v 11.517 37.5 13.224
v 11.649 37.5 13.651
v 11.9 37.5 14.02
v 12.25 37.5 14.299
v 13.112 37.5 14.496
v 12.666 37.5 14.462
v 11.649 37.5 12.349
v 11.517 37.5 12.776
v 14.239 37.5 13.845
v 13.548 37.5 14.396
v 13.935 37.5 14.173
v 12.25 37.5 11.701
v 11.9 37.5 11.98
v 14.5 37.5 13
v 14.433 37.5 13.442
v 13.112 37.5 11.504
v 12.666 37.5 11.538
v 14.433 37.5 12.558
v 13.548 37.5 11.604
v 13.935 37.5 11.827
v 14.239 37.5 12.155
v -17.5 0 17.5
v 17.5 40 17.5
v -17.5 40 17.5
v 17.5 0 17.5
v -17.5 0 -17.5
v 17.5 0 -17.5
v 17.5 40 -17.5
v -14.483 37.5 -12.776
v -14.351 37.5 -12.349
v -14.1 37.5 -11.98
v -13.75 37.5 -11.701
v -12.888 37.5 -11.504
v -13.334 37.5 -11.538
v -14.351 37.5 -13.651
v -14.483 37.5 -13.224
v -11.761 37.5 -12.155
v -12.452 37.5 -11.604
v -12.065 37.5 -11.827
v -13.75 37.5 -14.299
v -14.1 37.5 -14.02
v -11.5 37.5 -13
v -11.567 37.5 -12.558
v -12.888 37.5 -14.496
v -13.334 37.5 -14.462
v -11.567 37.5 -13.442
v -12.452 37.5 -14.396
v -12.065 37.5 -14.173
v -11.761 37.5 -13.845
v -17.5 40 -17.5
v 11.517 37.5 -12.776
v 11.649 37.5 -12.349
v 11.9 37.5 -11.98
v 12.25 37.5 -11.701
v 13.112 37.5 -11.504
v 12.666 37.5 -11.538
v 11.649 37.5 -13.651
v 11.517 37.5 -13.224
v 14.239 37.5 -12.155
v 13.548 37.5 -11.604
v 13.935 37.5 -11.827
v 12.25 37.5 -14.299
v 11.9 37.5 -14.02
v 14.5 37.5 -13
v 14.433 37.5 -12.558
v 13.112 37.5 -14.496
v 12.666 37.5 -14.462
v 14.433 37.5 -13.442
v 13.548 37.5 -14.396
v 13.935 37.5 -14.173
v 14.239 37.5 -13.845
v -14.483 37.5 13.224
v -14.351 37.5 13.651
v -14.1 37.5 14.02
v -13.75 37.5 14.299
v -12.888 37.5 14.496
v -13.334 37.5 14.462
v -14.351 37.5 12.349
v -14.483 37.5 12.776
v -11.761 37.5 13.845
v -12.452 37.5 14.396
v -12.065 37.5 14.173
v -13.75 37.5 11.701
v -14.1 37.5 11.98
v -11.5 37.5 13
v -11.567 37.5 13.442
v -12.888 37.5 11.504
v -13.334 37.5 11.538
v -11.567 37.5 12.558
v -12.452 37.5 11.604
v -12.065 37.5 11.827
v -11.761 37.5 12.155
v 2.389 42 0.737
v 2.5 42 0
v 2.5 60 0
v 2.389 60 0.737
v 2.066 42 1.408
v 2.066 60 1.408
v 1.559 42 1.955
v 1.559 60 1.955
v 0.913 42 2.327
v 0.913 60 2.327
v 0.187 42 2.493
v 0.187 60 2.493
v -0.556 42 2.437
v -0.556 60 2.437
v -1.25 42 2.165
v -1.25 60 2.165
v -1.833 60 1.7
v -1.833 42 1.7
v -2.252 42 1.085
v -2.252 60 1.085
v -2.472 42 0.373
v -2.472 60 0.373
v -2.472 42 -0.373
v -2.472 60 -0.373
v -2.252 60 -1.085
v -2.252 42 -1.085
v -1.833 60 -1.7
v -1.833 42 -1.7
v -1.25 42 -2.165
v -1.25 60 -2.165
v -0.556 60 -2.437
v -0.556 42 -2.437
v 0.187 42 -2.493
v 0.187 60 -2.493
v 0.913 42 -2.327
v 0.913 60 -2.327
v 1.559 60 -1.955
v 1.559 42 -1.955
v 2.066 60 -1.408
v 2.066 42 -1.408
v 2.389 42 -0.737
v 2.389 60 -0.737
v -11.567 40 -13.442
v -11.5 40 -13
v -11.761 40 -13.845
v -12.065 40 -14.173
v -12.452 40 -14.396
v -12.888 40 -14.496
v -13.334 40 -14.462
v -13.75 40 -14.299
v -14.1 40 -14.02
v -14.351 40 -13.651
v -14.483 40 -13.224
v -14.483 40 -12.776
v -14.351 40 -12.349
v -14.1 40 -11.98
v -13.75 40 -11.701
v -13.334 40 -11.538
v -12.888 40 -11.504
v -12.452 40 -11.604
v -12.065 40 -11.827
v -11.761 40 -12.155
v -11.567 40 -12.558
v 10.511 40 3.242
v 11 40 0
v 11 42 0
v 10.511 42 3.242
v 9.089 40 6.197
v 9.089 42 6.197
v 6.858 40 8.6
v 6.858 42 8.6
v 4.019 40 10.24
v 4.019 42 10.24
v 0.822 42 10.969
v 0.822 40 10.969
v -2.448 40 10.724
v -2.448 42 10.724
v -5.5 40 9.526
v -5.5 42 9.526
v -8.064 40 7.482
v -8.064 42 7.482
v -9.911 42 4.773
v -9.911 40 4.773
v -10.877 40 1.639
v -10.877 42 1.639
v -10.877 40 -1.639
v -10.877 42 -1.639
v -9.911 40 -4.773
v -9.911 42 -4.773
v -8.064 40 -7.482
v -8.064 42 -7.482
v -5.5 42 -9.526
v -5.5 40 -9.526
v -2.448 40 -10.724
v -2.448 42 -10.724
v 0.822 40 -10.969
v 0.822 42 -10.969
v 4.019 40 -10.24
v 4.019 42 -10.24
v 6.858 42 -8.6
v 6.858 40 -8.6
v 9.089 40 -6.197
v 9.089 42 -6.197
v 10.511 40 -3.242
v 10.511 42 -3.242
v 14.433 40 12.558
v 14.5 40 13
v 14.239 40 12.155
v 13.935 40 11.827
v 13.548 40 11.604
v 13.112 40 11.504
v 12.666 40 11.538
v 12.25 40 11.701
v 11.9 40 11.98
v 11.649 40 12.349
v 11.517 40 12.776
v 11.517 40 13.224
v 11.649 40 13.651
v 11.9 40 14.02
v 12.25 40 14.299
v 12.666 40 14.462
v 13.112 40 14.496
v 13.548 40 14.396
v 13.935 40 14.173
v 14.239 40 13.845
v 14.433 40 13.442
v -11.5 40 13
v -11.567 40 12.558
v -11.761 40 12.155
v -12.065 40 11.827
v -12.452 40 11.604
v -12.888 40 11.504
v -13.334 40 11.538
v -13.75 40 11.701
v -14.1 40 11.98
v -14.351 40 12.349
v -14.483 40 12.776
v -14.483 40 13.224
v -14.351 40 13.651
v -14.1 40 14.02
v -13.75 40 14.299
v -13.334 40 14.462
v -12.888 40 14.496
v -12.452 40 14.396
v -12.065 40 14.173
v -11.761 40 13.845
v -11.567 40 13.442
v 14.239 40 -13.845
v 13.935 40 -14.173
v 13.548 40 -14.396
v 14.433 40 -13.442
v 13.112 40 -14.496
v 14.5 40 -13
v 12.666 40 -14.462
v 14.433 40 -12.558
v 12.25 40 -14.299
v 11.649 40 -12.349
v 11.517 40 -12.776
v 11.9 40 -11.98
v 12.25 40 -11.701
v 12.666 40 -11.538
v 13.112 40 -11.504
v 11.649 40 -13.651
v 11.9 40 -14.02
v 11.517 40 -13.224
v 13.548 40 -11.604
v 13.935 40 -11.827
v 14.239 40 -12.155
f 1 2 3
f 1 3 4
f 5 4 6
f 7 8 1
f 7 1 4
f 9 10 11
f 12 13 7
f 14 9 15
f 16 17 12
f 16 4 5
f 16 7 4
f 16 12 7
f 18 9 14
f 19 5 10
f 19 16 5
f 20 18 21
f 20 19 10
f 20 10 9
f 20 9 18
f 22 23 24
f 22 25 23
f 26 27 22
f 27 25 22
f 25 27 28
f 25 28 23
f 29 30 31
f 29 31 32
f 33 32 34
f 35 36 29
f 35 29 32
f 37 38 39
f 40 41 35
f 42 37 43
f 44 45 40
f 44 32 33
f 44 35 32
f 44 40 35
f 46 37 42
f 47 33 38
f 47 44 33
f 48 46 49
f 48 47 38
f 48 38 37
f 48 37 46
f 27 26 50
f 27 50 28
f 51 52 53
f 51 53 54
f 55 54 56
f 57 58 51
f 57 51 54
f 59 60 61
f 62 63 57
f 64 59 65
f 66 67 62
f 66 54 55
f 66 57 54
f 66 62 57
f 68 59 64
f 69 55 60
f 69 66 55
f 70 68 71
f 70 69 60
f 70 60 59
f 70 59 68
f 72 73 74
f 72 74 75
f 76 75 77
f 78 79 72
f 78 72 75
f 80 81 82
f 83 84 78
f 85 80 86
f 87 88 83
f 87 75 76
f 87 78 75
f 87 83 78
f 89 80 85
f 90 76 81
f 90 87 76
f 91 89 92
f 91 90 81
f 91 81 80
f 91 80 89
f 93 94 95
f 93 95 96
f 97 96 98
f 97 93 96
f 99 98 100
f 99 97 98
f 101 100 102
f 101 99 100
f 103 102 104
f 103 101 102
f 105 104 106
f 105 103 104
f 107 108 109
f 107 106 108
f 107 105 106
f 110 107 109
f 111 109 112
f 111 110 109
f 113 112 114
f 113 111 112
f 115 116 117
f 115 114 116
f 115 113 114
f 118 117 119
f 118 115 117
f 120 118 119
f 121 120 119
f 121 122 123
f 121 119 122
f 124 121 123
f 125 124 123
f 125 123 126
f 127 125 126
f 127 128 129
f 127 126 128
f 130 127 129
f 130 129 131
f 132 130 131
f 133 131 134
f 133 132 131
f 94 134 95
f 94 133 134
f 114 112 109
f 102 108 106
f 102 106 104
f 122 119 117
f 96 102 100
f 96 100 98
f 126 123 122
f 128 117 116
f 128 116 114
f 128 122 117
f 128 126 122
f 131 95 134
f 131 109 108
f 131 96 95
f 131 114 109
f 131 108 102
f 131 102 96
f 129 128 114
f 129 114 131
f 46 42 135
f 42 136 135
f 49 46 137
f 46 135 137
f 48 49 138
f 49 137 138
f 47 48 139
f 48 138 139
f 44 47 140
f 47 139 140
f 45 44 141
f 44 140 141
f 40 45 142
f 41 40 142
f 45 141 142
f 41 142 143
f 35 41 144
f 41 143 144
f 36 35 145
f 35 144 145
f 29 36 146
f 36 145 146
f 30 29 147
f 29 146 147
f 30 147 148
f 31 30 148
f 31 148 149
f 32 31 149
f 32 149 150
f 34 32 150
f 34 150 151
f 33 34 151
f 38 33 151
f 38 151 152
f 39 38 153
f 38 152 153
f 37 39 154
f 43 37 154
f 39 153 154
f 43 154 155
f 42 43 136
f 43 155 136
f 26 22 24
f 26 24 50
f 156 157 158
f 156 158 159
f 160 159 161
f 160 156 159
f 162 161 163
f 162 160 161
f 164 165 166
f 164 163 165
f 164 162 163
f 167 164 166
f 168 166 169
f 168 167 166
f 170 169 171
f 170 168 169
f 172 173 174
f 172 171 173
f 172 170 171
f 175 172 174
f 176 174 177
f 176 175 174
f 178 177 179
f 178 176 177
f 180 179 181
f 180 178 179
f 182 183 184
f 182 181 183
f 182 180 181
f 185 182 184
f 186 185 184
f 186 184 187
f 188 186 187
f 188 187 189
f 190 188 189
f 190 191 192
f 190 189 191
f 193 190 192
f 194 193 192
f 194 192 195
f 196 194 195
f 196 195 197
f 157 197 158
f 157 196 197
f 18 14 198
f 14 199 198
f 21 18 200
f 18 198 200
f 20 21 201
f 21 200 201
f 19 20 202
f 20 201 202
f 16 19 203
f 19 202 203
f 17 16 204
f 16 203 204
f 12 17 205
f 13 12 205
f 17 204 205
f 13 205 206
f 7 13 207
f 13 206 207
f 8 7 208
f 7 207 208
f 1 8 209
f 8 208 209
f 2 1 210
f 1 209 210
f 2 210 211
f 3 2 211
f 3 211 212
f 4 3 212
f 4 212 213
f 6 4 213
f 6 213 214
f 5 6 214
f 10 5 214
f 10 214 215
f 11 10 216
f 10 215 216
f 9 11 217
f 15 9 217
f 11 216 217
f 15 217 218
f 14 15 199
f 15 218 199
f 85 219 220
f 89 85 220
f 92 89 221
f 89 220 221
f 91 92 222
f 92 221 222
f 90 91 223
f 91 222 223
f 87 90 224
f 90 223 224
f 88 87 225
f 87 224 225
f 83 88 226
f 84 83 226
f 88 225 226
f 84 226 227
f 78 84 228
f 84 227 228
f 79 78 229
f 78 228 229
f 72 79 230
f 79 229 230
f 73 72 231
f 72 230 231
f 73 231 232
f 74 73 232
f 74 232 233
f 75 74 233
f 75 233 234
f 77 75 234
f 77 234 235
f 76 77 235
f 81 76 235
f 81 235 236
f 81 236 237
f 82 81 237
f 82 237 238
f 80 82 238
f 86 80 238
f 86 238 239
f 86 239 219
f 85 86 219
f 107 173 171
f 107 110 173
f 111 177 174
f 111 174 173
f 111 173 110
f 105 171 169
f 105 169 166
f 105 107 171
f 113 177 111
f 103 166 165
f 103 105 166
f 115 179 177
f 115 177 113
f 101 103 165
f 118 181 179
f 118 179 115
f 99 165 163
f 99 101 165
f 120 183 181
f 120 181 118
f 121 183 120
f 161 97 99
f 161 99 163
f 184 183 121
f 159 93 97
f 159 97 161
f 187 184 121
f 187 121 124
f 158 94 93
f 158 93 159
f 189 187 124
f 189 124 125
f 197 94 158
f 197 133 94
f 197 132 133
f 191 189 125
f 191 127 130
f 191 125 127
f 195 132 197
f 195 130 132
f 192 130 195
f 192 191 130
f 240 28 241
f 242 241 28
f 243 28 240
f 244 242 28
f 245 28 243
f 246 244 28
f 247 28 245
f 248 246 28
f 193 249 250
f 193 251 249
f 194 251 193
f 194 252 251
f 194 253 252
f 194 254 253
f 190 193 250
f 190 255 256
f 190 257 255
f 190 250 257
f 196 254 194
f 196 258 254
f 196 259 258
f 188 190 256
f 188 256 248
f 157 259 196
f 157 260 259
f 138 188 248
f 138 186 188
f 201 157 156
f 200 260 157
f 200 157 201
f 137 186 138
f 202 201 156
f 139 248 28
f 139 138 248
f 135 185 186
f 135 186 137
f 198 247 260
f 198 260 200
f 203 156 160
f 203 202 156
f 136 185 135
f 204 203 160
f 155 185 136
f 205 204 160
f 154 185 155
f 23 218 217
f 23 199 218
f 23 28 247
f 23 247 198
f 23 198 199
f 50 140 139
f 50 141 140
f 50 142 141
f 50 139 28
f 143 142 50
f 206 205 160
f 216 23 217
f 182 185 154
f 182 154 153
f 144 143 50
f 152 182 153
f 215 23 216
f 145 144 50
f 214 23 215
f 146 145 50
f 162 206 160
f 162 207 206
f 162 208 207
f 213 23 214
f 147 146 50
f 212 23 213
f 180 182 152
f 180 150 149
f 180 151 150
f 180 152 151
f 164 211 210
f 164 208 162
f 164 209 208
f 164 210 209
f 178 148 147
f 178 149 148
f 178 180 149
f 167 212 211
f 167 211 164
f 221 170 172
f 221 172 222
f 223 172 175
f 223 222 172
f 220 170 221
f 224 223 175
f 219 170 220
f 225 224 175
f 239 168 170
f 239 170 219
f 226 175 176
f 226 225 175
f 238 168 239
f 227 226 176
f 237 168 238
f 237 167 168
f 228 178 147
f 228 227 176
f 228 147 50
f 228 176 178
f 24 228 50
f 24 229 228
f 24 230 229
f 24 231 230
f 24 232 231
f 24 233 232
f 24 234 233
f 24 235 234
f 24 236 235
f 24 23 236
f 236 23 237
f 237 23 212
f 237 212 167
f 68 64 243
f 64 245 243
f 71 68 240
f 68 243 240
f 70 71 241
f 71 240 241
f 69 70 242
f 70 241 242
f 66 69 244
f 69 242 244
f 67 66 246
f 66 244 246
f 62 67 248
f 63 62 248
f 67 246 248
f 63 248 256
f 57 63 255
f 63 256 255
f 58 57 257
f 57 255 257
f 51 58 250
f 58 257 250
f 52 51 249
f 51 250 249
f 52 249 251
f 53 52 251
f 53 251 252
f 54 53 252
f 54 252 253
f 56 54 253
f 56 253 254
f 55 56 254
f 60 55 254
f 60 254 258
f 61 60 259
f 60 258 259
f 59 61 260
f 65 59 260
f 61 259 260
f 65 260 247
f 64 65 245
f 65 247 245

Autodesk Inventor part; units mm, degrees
ref_plane "YZ Plane" through (0, 0, 0) normal (1, 0, 0) x (0, 1, 0)
ref_plane "XZ Plane" through (0, 0, 0) normal (0, 1, 0) x (-1, 0, 0)
ref_plane "XY Plane" through (0, 0, 0) normal (0, 0, 1) x (1, 0, 0)
sketch "草圖1" plane through (0, 0, 0) normal (0, 1, 0) x (-1, 0, 0)
  line L0 (-17.5, 17.5) -> (17.5, 17.5)
  line L1 (17.5, 17.5) -> (17.5, -17.5)
  line L2 (17.5, -17.5) -> (-17.5, -17.5)
  line L3 (-17.5, -17.5) -> (-17.5, 17.5)
  line L4 (-17.5, 17.5) -> (17.5, -17.5) construction
  line L5 (17.5, 17.5) -> (-17.5, -17.5) construction
  point P0 (0, 0)
  dimension "d0" = 35
  dimension "d1" = 35
extrude "擠出1" add sketch "草圖1" along normal blind 40
sketch "草圖2" plane through (0, 40, 0) normal (0, 1, 0) x (1, 0, 0)
  circle A0 centre (0, 0) radius 11
  dimension "d4" = 22
extrude "擠出2" add sketch "草圖2" along normal blind 2
sketch "草圖3" plane through (0, 42, 0) normal (0, 1, 0) x (1, 0, 0)
  circle A0 centre (0, 0) radius 2.5
  dimension "d7" = 5
extrude "擠出3" add sketch "草圖3" along normal blind 18
sketch "草圖4" plane through (0, 40, 0) normal (0, 1, 0) x (1, 0, 0)
  line L0 (13, -13) -> (-13, -13) construction
  line L1 (-13, -13) -> (-13, 13) construction
  line L2 (-13, 13) -> (13, 13) construction
  line L3 (13, 13) -> (13, -13) construction
  line L4 (13, -13) -> (-13, 13) construction
  line L5 (-13, -13) -> (13, 13) construction
  circle A0 centre (-13, -13) radius 1.5
  circle A1 centre (13, -13) radius 1.5
  circle A2 centre (13, 13) radius 1.5
  circle A3 centre (-13, 13) radius 1.5
  point P0 (0, 0)
  dimension "d10" = 26
  dimension "d11" = 26
  dimension "d12" = 3
  dimension "d15" = 360
extrude "擠出4" cut sketch "草圖4" against normal blind 2.5
sketch "草圖5" plane through (0, 0, 0) normal (0, -1, 0) x (1, 0, 0)
  circle A0 centre (0, 0) radius 11 projected
properties part number "35x40 stepper"
